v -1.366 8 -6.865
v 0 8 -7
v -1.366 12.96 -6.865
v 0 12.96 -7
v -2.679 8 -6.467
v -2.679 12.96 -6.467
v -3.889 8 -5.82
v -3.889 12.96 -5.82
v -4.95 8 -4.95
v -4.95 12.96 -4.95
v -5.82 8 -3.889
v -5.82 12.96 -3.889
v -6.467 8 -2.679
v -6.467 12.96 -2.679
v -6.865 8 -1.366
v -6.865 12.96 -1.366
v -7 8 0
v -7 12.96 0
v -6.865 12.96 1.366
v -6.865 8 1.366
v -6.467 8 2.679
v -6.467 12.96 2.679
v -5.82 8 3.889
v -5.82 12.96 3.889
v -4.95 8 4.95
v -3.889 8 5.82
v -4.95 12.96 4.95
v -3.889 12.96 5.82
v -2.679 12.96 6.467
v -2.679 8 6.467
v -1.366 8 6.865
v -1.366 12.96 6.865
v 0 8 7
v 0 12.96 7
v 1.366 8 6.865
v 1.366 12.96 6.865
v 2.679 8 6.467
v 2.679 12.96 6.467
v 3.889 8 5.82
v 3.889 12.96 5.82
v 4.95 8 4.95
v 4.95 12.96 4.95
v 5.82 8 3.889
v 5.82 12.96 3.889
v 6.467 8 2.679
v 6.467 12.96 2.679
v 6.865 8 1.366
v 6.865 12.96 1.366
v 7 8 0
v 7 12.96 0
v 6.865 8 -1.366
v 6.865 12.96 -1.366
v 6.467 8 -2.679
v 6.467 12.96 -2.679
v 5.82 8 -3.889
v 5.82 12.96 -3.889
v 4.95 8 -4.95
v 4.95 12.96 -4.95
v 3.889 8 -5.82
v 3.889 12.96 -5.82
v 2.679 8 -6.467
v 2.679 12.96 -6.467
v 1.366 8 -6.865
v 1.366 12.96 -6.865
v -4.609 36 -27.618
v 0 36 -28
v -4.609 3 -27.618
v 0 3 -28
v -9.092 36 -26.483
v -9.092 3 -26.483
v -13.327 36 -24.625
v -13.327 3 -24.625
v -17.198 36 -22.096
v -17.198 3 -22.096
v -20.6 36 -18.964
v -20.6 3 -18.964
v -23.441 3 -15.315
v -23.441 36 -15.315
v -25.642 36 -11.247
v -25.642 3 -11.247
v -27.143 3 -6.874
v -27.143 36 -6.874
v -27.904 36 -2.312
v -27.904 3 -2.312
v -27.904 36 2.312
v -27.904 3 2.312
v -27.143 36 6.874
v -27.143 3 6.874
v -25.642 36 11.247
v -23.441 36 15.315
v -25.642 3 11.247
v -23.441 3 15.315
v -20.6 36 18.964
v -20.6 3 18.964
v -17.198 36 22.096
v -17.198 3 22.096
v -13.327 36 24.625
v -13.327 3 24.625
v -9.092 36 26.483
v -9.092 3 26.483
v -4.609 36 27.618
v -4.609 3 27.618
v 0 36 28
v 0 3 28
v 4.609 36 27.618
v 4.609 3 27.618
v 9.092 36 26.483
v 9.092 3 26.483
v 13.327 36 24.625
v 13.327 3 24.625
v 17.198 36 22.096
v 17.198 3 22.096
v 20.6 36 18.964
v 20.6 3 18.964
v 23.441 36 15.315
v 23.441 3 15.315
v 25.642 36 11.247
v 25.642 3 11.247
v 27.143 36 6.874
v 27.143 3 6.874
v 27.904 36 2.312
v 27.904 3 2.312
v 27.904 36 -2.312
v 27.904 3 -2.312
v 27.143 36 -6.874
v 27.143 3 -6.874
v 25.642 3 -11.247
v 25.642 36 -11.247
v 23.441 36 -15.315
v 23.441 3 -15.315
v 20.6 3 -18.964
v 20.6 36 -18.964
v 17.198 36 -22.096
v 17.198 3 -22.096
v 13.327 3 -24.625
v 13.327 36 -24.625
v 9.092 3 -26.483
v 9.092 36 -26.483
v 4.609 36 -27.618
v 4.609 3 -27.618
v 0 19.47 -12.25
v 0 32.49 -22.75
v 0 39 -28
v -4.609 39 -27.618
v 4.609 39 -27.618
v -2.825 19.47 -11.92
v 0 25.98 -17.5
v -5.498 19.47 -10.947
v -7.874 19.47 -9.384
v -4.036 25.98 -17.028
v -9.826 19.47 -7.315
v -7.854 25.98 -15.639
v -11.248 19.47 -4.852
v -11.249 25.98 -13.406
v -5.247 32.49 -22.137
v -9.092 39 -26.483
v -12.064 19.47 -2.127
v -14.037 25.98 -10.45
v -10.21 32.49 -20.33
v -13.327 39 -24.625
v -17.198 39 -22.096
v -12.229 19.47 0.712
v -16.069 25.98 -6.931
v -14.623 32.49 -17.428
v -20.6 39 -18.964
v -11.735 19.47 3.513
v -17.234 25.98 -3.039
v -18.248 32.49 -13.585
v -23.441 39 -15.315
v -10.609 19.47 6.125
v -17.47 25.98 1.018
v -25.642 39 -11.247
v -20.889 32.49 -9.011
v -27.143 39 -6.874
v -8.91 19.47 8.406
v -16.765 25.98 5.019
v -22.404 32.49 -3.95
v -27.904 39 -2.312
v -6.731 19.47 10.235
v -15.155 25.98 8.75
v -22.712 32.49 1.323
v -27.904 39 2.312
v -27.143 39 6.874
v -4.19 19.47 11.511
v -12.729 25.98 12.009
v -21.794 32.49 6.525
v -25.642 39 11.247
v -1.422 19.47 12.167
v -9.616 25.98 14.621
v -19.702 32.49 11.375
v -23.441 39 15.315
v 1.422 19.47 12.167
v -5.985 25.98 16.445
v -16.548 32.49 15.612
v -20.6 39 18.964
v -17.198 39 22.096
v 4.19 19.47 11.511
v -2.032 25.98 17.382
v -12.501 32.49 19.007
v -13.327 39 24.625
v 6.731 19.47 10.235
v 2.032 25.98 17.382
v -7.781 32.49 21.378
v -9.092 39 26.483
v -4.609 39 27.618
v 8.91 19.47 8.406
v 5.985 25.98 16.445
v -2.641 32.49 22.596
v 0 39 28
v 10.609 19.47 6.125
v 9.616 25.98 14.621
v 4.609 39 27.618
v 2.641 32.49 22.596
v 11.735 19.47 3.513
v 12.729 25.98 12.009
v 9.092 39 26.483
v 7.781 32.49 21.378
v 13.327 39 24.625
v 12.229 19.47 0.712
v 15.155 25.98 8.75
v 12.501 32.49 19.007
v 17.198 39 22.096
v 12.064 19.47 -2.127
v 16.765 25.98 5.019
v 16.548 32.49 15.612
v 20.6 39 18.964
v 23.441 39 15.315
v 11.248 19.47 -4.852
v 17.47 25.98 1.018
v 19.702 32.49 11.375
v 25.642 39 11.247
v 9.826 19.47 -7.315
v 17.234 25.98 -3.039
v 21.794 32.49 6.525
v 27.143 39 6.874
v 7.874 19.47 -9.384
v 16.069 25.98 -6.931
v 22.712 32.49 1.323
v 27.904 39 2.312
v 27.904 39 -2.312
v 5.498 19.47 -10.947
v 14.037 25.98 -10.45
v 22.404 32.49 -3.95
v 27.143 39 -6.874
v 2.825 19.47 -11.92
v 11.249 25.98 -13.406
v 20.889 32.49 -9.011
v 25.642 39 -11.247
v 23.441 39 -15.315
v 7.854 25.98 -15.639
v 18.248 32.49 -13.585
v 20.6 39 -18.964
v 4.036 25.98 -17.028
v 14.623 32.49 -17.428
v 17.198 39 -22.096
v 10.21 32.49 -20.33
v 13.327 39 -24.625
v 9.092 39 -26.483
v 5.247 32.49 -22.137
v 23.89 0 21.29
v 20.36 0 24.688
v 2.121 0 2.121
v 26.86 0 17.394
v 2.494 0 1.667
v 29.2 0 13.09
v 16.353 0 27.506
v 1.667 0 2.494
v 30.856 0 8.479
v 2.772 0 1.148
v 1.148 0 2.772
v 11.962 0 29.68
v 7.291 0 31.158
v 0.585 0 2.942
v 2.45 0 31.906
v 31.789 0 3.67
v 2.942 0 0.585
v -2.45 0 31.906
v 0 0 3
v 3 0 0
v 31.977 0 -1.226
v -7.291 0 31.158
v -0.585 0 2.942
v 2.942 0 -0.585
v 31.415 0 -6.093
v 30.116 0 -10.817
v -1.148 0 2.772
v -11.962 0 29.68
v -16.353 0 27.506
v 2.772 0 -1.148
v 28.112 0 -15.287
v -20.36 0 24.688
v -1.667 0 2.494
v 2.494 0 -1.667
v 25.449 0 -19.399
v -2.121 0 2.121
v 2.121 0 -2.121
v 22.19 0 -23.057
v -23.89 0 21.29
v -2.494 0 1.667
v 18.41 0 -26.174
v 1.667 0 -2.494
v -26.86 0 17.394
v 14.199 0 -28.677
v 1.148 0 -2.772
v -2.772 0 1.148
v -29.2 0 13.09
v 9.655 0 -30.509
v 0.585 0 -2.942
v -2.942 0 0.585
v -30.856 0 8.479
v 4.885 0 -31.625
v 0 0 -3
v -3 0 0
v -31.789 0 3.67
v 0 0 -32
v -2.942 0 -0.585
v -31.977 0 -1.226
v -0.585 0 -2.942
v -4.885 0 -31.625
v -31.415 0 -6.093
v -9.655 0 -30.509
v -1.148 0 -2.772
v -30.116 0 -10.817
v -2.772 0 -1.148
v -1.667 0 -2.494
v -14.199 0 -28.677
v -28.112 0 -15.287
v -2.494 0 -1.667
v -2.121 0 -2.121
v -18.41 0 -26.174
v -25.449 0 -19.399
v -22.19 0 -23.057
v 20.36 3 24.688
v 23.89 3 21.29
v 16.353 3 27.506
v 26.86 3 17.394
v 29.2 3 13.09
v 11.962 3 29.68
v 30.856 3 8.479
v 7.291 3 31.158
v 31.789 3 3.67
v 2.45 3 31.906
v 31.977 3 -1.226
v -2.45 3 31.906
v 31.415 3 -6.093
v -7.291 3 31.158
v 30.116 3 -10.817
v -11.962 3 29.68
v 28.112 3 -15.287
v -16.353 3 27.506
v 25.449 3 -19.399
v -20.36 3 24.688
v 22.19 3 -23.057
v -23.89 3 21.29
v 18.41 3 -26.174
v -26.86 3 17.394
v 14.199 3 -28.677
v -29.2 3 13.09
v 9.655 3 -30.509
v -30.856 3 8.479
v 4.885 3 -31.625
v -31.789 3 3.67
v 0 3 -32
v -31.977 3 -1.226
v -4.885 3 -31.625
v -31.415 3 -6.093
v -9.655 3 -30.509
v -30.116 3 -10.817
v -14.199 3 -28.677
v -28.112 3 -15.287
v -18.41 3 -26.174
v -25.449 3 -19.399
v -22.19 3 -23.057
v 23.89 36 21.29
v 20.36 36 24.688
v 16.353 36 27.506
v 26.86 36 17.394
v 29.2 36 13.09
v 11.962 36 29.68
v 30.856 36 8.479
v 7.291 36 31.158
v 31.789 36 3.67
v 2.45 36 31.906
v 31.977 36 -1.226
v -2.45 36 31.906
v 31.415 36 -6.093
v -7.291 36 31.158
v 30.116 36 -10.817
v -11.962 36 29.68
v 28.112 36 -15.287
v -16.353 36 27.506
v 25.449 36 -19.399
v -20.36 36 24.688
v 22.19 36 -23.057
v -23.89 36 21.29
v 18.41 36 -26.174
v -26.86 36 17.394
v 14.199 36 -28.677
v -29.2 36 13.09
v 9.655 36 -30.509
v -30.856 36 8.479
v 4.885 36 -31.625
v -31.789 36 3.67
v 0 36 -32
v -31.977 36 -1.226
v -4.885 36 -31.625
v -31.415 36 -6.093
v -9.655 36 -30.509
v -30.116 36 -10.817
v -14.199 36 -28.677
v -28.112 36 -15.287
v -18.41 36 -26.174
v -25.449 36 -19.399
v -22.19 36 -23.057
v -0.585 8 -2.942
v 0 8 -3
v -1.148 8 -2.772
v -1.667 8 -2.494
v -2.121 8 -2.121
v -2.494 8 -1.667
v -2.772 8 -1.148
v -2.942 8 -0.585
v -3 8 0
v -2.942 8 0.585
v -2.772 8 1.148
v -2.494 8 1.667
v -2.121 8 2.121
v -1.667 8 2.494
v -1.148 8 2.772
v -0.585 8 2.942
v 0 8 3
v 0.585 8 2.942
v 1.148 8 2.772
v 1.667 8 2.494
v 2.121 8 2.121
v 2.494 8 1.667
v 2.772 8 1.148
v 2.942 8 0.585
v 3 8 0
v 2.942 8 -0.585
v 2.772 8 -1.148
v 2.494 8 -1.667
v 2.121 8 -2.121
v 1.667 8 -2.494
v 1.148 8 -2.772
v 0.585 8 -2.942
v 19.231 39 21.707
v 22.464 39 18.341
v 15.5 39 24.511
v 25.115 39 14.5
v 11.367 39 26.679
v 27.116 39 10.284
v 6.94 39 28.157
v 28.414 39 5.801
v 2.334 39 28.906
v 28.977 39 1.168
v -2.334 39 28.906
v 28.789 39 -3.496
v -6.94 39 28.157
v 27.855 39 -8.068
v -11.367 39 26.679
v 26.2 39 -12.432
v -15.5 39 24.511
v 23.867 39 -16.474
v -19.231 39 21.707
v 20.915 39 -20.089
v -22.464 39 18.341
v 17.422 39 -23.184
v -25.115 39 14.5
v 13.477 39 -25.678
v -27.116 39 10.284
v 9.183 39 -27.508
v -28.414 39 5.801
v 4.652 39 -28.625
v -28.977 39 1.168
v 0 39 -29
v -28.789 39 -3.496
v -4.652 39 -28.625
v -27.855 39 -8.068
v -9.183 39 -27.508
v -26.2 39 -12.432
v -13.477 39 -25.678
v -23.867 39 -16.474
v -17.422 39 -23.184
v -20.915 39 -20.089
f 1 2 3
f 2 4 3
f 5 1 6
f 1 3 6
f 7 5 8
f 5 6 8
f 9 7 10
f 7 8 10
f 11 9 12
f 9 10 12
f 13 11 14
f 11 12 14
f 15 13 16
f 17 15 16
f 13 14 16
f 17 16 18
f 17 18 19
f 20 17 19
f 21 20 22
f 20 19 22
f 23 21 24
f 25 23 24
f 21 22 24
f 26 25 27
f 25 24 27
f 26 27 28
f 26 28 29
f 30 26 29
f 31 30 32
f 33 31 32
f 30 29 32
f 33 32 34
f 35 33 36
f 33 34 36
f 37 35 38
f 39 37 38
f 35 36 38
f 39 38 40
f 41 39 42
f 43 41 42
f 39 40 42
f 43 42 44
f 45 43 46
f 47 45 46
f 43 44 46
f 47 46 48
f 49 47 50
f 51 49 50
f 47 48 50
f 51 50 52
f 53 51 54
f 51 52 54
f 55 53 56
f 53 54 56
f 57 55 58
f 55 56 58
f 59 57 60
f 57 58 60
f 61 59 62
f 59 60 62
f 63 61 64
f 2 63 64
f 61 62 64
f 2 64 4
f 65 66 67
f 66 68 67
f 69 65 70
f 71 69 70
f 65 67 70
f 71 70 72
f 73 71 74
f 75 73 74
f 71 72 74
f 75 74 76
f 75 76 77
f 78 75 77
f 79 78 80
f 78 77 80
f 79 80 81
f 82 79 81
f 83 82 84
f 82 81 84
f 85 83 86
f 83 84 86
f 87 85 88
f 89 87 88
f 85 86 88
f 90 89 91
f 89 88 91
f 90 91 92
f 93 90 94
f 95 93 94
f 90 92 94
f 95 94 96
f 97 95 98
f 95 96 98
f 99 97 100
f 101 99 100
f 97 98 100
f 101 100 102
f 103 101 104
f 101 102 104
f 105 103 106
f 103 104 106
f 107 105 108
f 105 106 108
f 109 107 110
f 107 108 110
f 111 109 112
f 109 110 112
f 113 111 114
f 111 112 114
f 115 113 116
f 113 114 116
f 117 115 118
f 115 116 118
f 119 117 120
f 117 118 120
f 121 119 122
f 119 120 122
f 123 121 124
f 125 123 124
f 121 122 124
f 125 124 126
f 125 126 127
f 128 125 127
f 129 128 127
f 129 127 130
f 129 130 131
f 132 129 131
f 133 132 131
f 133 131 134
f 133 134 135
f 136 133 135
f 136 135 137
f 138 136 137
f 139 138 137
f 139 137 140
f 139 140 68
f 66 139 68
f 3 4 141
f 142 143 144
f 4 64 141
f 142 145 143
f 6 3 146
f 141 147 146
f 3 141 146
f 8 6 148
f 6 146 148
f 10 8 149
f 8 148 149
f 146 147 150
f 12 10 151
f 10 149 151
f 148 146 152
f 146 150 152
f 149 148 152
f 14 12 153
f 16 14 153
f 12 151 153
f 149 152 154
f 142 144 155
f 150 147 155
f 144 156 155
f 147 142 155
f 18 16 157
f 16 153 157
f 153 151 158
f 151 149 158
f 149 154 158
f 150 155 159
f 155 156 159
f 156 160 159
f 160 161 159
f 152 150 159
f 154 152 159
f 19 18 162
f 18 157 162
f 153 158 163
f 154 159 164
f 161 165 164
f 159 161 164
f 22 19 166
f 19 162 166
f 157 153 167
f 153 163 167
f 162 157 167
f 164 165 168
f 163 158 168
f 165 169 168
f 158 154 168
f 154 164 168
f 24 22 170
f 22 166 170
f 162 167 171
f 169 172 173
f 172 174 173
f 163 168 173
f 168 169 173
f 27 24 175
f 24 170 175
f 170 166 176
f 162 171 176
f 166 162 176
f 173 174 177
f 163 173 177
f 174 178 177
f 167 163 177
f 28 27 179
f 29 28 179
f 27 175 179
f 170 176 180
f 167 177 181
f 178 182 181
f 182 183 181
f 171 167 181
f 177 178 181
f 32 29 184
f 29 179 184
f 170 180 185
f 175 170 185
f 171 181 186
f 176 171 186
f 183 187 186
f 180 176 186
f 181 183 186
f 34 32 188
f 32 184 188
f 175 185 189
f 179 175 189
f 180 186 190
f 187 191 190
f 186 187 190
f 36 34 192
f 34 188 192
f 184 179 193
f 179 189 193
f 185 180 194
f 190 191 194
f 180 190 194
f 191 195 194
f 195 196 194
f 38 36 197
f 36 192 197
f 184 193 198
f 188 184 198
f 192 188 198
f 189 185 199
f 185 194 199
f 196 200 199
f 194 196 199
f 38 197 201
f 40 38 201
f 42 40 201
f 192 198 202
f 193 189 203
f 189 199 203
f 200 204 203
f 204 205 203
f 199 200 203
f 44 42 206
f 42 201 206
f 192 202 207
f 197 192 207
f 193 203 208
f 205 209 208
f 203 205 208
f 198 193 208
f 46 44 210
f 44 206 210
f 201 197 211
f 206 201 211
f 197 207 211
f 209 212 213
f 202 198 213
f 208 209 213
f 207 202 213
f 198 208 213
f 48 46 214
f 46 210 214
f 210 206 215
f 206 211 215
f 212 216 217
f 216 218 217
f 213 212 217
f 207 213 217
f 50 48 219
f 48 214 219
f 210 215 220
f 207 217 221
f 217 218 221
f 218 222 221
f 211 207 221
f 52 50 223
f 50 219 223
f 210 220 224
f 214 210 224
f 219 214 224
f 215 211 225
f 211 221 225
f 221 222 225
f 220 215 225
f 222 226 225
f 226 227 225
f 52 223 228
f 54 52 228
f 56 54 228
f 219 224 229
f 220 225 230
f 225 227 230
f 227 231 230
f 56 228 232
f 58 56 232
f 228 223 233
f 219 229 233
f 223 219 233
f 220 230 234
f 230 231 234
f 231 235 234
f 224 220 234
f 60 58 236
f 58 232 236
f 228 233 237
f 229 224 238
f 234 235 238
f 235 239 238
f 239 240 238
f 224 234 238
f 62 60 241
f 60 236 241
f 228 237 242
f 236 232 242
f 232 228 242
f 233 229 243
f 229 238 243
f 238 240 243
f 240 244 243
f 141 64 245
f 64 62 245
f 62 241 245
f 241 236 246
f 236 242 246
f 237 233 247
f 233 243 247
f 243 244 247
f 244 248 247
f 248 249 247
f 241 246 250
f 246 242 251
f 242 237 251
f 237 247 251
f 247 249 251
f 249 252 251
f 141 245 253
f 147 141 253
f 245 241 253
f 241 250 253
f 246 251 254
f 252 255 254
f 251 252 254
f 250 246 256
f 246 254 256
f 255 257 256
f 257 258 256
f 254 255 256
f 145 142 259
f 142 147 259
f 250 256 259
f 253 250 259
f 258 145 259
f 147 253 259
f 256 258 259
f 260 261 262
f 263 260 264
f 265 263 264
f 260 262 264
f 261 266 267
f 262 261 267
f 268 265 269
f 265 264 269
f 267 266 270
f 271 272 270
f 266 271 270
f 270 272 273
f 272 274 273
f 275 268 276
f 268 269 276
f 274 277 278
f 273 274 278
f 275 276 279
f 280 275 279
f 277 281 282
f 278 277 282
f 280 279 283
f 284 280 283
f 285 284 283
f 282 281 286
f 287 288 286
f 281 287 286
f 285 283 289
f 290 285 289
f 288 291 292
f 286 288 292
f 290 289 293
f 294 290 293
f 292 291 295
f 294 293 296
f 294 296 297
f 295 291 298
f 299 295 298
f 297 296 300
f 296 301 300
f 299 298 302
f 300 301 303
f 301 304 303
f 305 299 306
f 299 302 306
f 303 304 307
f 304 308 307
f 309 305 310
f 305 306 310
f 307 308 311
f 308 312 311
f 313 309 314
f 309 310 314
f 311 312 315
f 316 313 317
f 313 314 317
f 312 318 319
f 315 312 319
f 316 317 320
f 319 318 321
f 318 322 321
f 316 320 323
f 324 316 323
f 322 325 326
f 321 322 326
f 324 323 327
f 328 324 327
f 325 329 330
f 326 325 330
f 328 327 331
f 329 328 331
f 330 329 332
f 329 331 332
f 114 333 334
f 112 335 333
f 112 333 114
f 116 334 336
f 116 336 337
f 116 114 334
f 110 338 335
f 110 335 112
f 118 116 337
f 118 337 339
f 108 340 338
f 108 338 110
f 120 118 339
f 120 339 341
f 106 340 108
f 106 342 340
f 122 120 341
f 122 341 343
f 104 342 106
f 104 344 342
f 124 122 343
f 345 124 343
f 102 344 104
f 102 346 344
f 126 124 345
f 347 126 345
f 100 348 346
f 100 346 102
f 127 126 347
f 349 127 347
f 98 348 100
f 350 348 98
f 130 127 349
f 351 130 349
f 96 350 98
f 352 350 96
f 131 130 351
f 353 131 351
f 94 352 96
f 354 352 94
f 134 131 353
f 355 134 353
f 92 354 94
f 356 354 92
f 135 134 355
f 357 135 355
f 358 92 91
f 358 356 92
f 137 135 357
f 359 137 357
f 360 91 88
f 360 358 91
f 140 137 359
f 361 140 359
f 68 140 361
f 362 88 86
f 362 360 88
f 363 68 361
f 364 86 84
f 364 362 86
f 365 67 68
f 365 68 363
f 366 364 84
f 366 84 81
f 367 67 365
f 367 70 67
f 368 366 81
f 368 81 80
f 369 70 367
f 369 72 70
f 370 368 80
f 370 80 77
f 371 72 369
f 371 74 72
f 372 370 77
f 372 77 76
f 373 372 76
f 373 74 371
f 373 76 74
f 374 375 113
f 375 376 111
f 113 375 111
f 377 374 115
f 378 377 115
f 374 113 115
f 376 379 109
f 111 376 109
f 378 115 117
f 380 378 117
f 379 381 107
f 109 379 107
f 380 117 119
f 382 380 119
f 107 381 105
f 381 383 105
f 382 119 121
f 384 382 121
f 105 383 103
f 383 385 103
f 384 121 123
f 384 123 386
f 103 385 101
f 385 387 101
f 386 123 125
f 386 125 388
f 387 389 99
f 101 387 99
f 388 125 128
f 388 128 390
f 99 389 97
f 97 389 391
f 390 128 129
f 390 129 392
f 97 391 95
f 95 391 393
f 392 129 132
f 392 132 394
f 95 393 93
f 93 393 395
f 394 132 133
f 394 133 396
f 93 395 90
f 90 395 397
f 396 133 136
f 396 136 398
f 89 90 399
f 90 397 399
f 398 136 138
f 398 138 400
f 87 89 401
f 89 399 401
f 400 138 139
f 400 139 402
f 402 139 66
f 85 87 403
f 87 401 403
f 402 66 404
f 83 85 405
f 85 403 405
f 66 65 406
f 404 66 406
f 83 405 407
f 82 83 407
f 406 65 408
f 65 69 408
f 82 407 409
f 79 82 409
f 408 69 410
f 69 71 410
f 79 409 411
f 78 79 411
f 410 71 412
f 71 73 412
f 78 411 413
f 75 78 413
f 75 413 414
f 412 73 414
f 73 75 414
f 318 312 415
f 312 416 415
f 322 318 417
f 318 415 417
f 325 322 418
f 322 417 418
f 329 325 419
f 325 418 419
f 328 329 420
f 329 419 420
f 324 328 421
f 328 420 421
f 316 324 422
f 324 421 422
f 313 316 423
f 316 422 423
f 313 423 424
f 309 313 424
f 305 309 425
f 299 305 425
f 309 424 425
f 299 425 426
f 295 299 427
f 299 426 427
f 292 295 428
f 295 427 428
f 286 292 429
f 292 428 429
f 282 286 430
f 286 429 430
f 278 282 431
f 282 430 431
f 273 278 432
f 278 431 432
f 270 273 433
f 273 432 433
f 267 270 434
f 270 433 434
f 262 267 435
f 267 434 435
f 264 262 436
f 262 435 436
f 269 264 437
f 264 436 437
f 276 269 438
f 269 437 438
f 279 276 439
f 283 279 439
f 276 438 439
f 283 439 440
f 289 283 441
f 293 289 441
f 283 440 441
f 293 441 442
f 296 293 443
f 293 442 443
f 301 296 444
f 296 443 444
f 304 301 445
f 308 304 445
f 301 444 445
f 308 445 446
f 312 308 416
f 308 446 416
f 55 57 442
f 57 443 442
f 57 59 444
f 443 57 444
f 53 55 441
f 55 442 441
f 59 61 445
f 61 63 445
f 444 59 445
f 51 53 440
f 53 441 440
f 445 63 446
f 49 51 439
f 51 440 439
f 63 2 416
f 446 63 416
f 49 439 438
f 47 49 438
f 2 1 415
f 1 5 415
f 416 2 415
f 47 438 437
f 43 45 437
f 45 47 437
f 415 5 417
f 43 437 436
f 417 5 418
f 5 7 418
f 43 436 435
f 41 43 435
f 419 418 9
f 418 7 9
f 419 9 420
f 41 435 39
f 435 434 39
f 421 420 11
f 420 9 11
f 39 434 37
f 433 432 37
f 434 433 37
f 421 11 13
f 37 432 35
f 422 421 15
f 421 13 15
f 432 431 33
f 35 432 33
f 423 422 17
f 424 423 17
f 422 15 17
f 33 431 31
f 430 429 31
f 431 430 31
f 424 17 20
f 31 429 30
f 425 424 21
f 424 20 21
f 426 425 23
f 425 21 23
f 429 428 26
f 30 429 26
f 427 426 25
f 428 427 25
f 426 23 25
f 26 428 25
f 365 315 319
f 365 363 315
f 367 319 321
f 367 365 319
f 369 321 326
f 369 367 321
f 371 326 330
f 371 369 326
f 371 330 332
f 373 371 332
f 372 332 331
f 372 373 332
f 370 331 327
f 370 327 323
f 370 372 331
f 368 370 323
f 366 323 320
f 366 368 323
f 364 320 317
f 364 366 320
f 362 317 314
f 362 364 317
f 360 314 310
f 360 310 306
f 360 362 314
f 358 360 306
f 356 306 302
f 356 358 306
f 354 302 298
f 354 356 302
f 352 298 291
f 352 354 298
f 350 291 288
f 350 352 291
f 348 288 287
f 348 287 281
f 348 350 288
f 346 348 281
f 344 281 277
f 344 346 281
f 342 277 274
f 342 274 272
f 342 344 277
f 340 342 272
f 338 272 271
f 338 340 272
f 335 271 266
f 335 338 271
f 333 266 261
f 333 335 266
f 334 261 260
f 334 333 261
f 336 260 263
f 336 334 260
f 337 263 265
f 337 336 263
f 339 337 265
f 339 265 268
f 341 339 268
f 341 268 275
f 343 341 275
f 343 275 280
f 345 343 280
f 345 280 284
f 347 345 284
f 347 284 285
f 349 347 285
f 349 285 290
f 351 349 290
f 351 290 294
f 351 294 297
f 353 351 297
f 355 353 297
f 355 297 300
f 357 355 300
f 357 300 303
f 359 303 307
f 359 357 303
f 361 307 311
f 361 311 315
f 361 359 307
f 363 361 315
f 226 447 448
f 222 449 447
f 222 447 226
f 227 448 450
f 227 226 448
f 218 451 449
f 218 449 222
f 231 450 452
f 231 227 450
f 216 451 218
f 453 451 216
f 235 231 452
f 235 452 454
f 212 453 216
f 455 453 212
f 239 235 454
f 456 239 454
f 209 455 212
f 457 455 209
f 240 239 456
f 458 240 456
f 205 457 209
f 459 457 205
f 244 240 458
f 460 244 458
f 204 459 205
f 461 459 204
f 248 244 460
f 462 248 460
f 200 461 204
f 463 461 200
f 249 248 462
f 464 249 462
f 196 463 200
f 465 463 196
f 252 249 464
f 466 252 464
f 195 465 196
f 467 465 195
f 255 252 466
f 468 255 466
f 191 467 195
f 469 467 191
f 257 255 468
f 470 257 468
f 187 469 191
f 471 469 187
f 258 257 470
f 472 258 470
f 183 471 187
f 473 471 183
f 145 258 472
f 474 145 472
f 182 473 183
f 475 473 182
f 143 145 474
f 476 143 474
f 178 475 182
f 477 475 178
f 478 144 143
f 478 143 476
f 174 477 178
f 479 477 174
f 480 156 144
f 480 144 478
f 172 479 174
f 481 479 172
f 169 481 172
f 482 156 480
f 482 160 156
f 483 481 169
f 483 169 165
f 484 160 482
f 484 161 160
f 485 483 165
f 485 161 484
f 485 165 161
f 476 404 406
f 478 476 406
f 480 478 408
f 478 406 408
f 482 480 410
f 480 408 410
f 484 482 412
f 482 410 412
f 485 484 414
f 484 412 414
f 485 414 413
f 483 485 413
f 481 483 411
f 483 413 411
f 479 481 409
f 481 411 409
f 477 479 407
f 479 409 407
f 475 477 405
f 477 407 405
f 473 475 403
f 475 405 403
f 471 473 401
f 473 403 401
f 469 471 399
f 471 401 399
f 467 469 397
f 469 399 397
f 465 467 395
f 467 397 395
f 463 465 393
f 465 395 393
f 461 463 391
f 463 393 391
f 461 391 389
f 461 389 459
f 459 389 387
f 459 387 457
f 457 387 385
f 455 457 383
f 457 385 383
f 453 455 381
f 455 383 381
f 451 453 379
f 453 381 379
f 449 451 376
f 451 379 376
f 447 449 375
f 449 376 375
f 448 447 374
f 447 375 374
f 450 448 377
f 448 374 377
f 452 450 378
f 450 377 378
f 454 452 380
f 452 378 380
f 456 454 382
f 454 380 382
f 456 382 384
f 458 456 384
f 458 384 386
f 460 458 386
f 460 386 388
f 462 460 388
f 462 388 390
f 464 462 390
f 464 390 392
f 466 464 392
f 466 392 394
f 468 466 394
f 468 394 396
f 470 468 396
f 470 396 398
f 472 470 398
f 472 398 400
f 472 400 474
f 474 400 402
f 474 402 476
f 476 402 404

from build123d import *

# Parameters (mm, degrees)
SKETCH2_W     = 4
SKETCH2_H     = 3
CHAMFER1_SIZE = 3


with BuildPart() as part:
    # Sketch2 → Revolve1 (revolve)
    with BuildSketch(Plane.XY, mode=Mode.PRIVATE) as revolve1_sk:
        Polygon((-28, 0), (-3, 0), (-3, 8), (-7, 8), (-7, 12.96), (-28, 39), (-28, 36), (-28, 3), align=None)
        with Locations((-30, 1.5)):
            Rectangle(SKETCH2_W, SKETCH2_H)
        with Locations((-30, 37.5)):
            Rectangle(SKETCH2_W, SKETCH2_H)
    revolve(revolve1_sk.sketch.rotate(Axis((0, 0, 0), (0, 1, 0)), 270), axis=Axis((0, 0, 0), (0, 1, 0)))

    # Chamfer1
    chamfer1_edges = [part.edges().sort_by_distance(p)[0] for p in [
        (0, 39, 32),
    ]]
    chamfer(chamfer1_edges, length=CHAMFER1_SIZE - 0.0001)  # a hair under: the kernel refuses the full size


solid = part.part
